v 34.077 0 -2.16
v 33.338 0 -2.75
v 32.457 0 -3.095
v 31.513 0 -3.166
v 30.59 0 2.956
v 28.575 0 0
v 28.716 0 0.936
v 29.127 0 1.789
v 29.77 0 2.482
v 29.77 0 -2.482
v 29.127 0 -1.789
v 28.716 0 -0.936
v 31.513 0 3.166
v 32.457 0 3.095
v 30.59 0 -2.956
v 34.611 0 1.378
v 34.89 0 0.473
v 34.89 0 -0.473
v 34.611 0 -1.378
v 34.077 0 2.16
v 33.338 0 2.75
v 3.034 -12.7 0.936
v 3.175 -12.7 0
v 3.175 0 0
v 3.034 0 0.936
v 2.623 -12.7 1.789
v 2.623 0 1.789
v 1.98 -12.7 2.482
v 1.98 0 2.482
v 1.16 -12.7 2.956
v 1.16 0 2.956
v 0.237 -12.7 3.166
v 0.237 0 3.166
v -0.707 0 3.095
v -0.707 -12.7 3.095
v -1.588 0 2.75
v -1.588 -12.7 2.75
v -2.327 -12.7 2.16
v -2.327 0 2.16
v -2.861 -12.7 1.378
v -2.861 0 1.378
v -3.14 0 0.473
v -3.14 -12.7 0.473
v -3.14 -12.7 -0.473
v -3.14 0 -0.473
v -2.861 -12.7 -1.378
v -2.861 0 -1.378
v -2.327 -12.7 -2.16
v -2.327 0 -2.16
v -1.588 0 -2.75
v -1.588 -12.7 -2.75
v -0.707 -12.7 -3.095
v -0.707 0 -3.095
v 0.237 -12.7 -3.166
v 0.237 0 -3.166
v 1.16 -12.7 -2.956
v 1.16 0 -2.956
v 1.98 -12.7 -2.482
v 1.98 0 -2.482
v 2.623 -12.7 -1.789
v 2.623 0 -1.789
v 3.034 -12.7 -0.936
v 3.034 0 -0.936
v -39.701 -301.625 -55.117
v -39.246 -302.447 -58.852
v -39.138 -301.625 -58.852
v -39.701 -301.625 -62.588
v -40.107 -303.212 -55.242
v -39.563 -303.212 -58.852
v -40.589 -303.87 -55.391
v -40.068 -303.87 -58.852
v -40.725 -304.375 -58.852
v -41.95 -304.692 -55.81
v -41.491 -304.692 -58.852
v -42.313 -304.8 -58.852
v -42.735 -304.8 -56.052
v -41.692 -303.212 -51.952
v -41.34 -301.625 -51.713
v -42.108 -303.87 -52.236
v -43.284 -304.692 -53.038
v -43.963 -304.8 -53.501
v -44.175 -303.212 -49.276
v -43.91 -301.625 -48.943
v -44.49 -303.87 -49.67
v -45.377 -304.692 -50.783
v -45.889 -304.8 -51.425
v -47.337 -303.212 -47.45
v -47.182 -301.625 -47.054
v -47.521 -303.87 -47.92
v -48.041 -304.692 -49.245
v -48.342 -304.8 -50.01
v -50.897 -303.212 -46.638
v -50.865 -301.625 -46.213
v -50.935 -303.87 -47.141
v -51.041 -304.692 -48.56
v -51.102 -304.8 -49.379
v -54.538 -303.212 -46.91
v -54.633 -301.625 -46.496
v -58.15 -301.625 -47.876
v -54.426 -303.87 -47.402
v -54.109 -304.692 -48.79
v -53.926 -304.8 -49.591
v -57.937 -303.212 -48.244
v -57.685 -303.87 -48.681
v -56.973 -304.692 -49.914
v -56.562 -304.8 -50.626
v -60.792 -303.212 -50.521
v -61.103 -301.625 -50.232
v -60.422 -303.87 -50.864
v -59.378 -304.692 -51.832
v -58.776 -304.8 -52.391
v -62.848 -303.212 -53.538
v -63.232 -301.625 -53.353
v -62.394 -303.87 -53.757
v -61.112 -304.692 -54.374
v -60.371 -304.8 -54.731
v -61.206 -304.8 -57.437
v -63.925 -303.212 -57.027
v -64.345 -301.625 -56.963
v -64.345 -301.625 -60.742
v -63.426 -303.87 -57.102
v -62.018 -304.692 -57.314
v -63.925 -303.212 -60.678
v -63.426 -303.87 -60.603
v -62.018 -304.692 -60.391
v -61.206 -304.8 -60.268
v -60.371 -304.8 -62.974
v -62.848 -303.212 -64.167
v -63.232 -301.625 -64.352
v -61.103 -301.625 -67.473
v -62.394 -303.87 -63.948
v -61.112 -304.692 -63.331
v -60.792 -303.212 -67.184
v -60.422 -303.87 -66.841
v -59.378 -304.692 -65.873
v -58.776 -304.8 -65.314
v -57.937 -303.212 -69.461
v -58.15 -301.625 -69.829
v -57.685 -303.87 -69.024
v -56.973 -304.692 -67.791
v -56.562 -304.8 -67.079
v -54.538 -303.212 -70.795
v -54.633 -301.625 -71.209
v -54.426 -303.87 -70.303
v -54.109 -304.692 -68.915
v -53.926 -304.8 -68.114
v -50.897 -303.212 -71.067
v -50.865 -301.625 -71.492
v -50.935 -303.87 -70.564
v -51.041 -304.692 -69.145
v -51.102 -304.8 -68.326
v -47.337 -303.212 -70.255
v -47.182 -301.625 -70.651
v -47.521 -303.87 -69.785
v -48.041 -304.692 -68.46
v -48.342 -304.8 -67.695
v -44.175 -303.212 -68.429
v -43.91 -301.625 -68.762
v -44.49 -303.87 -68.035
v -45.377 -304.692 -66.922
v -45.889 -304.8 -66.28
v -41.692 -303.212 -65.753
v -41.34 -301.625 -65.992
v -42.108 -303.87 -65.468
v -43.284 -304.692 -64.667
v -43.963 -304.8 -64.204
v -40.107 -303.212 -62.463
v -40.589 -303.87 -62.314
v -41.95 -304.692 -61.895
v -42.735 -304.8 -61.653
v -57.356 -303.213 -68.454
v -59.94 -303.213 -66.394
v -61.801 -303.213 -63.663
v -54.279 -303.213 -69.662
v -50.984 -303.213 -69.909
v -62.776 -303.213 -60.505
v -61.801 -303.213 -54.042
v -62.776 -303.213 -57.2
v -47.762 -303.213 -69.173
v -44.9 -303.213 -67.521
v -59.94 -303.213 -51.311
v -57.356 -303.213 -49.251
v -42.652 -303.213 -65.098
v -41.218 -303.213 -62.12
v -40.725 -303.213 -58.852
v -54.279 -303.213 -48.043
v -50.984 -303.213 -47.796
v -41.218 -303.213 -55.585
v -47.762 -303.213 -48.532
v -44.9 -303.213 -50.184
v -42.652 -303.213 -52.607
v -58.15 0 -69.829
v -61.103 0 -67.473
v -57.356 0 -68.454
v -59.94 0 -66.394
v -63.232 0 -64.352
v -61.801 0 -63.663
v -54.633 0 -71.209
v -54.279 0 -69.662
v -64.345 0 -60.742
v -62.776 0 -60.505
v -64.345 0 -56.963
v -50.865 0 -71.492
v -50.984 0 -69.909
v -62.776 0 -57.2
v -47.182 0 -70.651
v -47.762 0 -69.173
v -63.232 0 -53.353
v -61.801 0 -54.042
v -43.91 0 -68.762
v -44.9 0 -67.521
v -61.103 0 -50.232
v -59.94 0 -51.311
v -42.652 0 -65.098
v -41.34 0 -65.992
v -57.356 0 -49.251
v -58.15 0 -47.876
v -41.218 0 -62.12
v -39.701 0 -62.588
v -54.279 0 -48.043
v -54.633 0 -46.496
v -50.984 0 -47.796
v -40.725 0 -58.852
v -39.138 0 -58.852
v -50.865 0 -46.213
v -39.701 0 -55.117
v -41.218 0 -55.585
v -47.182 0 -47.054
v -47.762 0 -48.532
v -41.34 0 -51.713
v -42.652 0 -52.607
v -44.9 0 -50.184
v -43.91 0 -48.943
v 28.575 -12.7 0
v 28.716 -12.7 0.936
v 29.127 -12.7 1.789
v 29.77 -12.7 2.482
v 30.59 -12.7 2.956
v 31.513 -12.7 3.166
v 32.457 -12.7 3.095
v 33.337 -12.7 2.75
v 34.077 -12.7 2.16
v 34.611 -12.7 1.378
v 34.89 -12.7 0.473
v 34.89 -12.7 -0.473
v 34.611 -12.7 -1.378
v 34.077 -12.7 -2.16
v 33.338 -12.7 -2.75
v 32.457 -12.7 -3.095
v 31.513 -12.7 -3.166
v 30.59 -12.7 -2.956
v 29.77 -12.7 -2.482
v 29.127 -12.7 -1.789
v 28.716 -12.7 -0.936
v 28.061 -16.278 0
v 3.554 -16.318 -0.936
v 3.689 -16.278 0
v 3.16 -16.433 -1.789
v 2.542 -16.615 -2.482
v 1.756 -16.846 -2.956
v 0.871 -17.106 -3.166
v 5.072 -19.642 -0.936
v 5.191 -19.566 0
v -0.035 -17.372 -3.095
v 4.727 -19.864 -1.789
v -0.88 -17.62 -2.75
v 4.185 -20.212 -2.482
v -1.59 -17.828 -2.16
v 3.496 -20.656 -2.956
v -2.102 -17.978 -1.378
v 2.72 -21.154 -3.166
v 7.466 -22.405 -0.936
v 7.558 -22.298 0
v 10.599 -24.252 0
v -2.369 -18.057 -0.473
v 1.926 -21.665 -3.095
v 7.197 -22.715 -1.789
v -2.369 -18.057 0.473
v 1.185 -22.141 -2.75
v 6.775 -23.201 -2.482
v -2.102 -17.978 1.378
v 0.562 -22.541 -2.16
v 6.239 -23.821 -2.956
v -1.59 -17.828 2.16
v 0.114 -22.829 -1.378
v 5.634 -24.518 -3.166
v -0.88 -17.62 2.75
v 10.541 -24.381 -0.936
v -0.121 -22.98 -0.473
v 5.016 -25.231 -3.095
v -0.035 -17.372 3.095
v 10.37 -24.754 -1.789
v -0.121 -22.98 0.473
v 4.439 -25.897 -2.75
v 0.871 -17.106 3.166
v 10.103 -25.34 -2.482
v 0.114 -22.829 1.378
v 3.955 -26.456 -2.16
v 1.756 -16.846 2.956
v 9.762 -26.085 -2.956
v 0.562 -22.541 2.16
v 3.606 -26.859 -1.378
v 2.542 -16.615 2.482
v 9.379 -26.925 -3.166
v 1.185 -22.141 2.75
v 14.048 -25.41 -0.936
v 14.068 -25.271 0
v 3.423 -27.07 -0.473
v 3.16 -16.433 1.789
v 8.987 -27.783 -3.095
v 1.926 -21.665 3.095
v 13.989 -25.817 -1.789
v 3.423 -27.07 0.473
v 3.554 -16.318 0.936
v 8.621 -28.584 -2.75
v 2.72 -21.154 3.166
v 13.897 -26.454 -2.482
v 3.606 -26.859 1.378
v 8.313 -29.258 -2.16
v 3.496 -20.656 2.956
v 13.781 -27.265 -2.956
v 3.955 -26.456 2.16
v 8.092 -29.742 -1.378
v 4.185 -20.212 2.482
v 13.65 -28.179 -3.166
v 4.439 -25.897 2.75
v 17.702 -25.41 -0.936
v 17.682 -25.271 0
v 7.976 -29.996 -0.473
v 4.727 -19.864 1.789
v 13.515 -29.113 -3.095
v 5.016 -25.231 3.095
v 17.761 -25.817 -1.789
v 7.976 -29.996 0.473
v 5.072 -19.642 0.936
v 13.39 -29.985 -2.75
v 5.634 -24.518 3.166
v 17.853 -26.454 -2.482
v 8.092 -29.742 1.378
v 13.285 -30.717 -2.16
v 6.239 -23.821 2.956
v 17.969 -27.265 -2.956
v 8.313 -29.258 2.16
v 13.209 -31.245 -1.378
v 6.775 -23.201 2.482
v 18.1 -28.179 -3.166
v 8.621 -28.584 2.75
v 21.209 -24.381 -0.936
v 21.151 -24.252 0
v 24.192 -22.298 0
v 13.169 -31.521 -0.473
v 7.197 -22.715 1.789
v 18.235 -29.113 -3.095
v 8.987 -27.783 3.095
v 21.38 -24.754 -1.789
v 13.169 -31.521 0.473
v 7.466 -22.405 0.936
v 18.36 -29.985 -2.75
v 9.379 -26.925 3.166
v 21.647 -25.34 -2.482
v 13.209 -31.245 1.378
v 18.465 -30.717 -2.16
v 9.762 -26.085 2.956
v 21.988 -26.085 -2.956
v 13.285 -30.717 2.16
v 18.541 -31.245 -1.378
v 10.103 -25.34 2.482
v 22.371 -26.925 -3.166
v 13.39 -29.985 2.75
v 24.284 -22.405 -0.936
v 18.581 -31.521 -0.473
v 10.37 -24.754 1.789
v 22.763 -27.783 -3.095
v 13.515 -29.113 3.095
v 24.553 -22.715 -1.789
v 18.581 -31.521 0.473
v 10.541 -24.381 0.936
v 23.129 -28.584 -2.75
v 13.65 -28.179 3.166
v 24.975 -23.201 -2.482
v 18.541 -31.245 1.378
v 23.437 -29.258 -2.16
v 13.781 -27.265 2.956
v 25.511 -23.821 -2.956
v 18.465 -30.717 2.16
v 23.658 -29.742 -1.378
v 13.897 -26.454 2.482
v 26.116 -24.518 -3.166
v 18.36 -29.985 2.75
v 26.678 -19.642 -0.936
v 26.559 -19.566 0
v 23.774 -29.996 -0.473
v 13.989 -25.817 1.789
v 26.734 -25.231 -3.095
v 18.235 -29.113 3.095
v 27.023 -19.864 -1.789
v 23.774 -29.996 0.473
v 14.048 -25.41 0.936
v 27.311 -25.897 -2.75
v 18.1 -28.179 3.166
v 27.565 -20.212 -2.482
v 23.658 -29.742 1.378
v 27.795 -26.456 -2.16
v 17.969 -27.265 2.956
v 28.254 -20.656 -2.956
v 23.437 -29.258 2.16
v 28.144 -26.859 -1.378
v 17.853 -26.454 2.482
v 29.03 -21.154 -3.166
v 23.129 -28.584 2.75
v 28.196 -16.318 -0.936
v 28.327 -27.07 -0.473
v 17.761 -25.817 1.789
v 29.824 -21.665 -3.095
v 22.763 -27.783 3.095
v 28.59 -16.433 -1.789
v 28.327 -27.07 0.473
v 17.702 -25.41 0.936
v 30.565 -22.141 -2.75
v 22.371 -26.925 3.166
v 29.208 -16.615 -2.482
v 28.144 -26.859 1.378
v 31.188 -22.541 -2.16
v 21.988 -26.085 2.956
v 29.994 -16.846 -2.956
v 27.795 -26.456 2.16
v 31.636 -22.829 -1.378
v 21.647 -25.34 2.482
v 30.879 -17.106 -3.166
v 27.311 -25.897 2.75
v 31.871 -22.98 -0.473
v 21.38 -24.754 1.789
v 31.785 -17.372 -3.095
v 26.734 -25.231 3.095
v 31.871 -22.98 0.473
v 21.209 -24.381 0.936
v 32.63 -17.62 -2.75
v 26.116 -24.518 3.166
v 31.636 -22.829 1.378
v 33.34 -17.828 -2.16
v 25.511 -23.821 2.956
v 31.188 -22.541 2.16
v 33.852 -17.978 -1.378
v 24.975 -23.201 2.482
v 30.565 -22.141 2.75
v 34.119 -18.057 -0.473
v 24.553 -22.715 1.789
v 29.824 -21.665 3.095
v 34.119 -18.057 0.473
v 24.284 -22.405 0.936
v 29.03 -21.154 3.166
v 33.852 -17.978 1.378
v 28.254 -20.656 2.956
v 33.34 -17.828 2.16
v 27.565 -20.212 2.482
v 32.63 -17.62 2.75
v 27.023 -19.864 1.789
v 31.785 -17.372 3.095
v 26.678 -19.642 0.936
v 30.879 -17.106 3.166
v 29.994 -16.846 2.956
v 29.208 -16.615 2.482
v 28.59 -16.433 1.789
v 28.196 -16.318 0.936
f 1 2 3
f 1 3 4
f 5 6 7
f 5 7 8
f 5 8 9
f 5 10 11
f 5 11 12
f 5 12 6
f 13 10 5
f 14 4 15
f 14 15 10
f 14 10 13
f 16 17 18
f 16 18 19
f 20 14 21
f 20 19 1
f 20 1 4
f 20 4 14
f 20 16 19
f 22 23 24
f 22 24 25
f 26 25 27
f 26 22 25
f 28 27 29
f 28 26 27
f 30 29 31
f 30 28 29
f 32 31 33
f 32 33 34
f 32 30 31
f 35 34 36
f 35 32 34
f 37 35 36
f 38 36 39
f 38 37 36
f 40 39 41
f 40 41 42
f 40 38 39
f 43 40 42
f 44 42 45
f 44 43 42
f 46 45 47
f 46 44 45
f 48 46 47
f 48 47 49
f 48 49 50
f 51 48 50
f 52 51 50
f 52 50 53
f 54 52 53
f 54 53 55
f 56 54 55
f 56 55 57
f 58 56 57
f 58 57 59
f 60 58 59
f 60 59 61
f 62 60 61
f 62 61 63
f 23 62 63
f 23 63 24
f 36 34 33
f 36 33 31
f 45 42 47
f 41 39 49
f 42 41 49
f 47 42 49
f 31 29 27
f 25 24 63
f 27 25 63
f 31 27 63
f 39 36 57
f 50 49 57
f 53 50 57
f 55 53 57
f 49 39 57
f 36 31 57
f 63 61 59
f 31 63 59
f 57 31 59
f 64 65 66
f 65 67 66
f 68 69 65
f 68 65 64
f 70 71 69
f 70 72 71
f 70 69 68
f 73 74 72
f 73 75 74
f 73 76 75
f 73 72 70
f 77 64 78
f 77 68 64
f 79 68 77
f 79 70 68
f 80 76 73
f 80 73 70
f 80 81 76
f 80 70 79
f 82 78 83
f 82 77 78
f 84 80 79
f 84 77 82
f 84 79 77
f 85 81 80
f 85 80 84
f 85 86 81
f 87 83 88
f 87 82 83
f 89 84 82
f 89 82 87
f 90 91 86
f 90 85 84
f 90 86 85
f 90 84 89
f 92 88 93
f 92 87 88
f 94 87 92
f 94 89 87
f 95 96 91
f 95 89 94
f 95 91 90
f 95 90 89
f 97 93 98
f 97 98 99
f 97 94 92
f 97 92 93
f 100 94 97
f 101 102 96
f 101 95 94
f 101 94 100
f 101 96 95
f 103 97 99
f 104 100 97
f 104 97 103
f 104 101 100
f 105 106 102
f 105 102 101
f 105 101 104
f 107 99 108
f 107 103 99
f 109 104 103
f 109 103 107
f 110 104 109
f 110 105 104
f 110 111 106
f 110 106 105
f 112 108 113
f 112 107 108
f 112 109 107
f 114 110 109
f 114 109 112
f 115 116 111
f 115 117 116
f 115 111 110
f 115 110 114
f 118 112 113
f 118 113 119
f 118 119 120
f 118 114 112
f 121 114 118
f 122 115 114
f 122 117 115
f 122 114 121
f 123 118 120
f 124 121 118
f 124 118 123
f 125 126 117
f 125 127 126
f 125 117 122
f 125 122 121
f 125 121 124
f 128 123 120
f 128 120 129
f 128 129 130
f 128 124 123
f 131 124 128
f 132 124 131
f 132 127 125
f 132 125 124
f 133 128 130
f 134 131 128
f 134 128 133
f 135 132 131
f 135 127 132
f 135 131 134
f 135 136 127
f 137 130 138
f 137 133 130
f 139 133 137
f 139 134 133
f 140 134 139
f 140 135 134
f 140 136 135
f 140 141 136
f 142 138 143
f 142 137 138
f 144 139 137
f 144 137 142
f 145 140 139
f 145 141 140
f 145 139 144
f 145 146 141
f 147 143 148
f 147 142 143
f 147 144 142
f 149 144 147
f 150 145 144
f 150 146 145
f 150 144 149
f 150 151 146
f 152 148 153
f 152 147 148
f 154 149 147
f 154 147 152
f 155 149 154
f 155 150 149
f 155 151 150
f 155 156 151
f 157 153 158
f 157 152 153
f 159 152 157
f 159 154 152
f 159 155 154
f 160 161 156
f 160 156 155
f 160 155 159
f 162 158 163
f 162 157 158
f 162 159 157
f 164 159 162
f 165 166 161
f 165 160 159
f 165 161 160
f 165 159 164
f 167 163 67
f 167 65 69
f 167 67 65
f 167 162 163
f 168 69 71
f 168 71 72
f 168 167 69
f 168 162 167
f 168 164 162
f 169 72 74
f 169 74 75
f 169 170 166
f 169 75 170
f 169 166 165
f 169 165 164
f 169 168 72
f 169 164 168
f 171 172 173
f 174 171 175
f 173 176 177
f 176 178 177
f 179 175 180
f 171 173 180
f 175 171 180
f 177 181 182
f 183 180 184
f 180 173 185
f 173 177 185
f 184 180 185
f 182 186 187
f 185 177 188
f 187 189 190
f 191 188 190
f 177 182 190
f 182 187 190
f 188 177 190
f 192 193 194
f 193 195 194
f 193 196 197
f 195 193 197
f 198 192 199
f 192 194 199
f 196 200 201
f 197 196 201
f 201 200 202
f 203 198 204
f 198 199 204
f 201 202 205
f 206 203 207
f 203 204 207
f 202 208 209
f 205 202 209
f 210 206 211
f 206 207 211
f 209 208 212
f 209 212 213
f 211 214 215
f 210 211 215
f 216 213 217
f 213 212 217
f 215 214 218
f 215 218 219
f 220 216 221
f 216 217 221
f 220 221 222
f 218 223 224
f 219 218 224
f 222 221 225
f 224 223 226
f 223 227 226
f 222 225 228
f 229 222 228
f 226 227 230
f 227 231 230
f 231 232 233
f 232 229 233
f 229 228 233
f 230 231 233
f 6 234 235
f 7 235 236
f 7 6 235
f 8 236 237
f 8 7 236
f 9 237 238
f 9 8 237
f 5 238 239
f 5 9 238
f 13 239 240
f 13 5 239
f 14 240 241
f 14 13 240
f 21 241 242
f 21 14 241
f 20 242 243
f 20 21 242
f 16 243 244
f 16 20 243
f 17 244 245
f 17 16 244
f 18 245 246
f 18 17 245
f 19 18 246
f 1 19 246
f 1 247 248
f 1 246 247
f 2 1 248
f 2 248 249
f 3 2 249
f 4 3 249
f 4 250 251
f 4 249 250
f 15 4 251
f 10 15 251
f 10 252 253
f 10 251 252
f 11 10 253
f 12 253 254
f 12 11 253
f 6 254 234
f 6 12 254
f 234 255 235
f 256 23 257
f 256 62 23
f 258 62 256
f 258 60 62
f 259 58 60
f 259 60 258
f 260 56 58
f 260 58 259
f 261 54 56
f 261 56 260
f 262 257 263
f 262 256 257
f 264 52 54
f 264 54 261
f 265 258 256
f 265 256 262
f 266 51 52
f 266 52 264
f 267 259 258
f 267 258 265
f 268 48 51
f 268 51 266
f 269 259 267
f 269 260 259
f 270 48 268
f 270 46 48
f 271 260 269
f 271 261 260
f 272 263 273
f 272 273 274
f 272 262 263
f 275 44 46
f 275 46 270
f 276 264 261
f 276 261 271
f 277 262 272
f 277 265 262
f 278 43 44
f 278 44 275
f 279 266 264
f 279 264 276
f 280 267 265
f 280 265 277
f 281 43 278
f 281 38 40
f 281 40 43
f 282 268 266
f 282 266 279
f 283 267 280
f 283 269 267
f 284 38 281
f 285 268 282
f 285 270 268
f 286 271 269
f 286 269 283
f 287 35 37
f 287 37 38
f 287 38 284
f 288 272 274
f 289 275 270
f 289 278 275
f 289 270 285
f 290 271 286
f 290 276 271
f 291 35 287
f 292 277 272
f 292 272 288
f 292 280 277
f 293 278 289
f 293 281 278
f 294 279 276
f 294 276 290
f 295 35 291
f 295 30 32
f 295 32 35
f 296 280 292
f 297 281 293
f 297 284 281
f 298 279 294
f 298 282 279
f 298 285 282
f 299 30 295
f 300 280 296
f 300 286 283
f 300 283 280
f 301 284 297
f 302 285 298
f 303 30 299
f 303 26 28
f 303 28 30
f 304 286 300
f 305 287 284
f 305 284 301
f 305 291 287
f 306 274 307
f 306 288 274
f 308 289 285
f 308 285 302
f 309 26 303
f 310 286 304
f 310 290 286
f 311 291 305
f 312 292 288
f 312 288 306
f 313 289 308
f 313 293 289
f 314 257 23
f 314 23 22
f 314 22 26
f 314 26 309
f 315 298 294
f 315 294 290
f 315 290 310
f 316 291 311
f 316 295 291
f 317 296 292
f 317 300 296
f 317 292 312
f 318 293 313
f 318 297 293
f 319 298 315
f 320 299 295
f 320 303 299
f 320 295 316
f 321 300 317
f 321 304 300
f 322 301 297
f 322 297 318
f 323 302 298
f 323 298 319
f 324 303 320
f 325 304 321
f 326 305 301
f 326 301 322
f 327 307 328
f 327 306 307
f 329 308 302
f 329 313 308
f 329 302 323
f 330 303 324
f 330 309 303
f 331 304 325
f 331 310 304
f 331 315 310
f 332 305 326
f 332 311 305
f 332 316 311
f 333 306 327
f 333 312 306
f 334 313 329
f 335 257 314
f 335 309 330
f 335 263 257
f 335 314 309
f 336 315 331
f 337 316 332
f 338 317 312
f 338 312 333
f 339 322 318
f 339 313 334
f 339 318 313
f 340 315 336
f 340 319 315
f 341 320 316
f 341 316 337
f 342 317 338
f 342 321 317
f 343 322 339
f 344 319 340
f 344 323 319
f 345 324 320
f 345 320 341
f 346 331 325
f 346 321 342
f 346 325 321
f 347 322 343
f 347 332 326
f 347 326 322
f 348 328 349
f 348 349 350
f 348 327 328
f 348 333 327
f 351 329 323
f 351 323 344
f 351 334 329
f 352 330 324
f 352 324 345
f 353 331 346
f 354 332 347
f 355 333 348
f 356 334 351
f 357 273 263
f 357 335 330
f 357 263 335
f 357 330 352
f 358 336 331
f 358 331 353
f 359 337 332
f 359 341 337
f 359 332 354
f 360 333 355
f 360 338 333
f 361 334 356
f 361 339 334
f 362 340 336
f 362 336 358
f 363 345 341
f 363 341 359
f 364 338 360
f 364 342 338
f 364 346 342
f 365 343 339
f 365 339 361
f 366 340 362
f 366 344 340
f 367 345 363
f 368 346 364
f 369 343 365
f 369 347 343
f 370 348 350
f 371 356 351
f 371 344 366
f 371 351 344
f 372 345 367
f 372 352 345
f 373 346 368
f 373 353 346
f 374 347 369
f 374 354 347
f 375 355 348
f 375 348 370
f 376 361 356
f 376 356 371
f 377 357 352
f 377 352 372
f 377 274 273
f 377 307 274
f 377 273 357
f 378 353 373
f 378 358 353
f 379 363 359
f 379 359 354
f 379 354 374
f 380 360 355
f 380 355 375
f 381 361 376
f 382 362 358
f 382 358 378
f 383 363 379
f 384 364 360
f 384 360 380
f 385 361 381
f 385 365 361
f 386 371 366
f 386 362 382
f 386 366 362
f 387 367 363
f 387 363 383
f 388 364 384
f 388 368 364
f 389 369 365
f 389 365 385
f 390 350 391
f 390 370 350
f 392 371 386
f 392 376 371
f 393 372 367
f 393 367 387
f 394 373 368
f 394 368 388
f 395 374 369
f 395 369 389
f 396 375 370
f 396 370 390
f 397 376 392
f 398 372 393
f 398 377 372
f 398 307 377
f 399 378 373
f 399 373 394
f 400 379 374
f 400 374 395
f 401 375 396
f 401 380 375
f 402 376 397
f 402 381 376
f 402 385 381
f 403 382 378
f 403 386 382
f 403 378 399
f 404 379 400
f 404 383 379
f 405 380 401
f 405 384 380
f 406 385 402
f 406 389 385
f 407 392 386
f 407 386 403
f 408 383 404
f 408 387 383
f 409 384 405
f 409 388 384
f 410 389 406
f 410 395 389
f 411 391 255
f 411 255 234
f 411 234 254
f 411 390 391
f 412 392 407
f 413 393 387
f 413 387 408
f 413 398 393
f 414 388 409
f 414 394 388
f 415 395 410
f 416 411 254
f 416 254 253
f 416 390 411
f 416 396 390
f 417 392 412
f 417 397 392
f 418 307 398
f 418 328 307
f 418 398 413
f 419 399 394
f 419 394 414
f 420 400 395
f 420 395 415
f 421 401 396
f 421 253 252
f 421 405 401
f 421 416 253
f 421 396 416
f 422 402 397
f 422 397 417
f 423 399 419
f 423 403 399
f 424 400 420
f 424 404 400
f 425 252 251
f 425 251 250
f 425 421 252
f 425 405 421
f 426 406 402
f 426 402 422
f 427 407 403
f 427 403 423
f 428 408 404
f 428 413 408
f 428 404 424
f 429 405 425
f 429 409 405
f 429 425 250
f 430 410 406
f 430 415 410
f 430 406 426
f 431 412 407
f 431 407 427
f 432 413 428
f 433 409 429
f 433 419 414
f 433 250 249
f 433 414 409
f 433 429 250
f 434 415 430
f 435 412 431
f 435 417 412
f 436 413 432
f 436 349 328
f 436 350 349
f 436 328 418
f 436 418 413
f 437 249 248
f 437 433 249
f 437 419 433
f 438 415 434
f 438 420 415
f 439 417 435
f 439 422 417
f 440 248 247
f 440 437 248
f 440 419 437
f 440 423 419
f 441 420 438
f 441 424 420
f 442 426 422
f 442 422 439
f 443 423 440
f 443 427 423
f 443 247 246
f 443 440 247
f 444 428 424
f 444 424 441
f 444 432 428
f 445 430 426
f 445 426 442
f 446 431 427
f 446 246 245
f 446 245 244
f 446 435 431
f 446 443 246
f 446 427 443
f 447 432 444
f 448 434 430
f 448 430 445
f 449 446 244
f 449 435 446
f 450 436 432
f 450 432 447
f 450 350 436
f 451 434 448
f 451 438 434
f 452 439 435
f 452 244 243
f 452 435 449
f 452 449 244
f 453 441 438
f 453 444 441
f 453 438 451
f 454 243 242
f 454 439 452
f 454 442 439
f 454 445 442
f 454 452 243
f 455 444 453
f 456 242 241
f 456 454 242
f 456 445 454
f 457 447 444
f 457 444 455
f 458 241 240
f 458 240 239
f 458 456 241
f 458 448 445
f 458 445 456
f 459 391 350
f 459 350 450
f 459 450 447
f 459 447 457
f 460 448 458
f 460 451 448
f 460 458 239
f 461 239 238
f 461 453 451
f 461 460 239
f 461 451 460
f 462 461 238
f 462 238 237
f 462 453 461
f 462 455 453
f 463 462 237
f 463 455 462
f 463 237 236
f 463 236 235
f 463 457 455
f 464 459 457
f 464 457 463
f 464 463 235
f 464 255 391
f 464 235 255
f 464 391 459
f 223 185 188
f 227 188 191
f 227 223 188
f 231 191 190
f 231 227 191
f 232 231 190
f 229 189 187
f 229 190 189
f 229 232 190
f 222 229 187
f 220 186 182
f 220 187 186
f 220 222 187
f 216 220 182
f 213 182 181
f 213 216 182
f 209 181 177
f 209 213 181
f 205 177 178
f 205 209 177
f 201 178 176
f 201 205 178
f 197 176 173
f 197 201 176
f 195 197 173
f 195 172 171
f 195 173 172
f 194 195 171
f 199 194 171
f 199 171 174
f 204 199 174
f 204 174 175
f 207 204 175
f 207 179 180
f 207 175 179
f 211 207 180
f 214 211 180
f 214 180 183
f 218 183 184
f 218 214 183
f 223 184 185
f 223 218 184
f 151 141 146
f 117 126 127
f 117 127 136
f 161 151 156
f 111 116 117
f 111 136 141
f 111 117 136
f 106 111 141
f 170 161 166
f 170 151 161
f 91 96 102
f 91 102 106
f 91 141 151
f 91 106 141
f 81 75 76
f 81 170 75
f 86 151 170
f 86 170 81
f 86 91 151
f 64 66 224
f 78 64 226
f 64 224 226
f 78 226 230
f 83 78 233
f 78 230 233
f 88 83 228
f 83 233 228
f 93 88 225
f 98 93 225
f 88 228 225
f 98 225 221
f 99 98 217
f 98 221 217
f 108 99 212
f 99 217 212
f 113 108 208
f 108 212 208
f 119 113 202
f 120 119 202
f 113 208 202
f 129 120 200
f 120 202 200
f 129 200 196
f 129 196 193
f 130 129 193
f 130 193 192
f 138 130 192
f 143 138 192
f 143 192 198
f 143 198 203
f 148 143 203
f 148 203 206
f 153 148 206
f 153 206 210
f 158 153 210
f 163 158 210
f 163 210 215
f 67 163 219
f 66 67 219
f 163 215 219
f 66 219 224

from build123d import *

# Parameters (mm, degrees)
F0_R     = 3.175
F3_R     = 12.6746
F4_DEPTH = 304.8
F5_T     = -1.5875
F6_R     = 3.175


with BuildPart() as f2:
    # F2: sweep along a path in F1
    with BuildLine(Plane.XY) as f2_path:
        Line((0, 0), (0, -12.7))
        ThreePointArc((0, -12.7), (15.875, -28.575), (31.75, -12.7))
        Line((31.75, -12.7), (31.75, 0))
    # F0 (on Front) → F2 (sweep)
    with BuildSketch(Plane.XZ):
        Circle(F0_R)
    sweep(path=f2_path.line)


with BuildPart() as f4:
    # F3 (on Front) → F4 (new body)
    with BuildSketch(Plane.XZ):
        with Locations((-51.812302, -58.852494)):
            Circle(F3_R)
    extrude(amount=F4_DEPTH)

    # F5
    f5_openings = [f4.faces().sort_by_distance(p)[0] for p in [
        (-51.812302, 0, -58.852494),
    ]]
    offset(amount=F5_T, openings=f5_openings)

    # F6
    f6_edges = [f4.edges().sort_by_distance(p)[0] for p in [
        (-64.486902, -304.8, -58.852494),
    ]]
    fillet(f6_edges, radius=F6_R)


solid = Compound([f2.part, f4.part])
